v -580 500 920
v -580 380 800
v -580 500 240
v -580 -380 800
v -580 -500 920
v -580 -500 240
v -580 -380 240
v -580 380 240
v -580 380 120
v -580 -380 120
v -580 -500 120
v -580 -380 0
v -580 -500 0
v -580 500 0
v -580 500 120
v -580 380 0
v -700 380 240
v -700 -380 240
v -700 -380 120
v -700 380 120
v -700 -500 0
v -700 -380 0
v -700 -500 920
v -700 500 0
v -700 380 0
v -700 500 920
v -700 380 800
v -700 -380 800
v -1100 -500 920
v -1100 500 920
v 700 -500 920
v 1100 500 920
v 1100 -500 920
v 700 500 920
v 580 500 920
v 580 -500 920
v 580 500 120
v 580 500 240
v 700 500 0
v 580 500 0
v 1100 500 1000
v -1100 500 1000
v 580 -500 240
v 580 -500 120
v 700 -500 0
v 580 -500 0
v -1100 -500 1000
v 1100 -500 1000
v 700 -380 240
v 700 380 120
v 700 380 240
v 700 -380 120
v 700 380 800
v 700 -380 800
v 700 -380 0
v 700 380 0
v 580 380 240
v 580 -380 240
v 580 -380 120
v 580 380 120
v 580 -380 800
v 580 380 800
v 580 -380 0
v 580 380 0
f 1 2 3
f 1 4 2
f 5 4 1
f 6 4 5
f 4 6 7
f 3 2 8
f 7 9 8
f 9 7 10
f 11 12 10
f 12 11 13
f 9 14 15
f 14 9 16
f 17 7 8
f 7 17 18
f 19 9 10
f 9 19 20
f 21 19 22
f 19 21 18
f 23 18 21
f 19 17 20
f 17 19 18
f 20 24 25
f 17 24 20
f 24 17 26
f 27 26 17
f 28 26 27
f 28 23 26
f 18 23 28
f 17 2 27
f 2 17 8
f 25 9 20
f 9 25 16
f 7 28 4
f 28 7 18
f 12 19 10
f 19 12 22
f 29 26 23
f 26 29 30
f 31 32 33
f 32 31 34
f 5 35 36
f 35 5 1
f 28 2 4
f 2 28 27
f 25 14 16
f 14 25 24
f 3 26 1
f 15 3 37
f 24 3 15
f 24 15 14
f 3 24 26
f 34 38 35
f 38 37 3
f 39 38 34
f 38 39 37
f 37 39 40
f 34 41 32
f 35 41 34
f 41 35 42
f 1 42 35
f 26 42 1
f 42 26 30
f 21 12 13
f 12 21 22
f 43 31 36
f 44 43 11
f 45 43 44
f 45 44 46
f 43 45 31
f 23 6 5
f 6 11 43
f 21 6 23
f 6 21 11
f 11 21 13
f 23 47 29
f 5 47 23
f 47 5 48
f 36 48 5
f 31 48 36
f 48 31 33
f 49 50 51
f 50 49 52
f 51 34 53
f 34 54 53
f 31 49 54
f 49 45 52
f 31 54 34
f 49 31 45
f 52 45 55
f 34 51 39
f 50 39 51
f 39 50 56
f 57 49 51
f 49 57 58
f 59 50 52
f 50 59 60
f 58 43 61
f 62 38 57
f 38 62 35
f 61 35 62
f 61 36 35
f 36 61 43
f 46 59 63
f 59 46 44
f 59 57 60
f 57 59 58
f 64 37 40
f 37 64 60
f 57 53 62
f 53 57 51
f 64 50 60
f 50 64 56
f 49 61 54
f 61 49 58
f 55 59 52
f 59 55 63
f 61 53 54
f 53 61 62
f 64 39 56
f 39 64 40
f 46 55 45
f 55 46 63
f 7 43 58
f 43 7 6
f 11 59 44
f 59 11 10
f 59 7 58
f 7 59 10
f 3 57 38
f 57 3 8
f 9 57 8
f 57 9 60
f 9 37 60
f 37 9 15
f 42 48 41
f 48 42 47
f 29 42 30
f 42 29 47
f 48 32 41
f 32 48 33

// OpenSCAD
module workbench(width = 1000, length = 1500, height = 1000, deskThickness = 80, legThickness = 80, overstandDesk = 50) {

    legInnerWidth = width - legThickness * 2;
    legInnerLength = length - overstandDesk * 2 - legThickness * 2;
    legInnerHeight = height - deskThickness;

    module desk() {
        rotate([0, 0, 90]) translate([0, 0, deskThickness/2 + height - deskThickness]) cube(size = [width, length, deskThickness], center = true);
    }

    module legBase() {
        translate([-legInnerLength/2 - legThickness/2, 0, 0]) {
            leg();
            translate([legInnerLength+legThickness, 0, 0]) leg();
            
            // bottom right cross beam lenth
            rotate([0, 0, 90]) translate([-(legInnerWidth/2 + legThickness/2), -(legInnerLength/2 + legThickness/2), legThickness + legThickness/2]) cube(size=[legThickness, legInnerLength, legThickness], center = true);
            rotate([0, 0, 90]) translate([+(legInnerWidth/2 + legThickness/2), -(legInnerLength/2 + legThickness/2), legThickness + legThickness/2]) cube(size=[legThickness, legInnerLength, legThickness], center = true);
        }
    }

    module leg() {
        // bottom cross beam width
        translate([0, 0, legThickness + legThickness/2]) cube(size=[legThickness, legInnerWidth, legThickness], center = true);
        // top cross beam width
        translate([0, 0, legInnerHeight - legThickness/2]) cube(size=[legThickness, legInnerWidth, legThickness], center = true);

        // left leg
        translate([0, legInnerWidth/2 + legThickness/2, legInnerHeight/2]) cube(size=[legThickness, legThickness, legInnerHeight], center = true);
        // right leg
        translate([0, -(legInnerWidth/2 + legThickness/2), legInnerHeight/2]) cube(size=[legThickness, legThickness, legInnerHeight], center = true);
    }

    module partsList() {
        // desk
        echo(str("Tischplatte", ";", "1", ";", length, ";", width, ";", deskThickness));
        // legs
        echo(str("Beine", ";", "4", ";", legInnerHeight, ";", legThickness, ";", legThickness));
        // leg cross bars
        echo(str("Beine Querstreben", ";", "4", ";", legInnerWidth, ";", legThickness, ";", legThickness));
        // leg cross bars length
        echo(str("Beine Längsstreben", ";", "2", ";", legInnerLength, ";", legThickness, ";", legThickness));
    }

    legBase();
    desk();

    partsList();
}

//scaleFactor = 10;
//scale([1 / scaleFactor, 1 / scaleFactor, 1 / scaleFactor]) {
    // translate for printing
    //translate([0,0,1000])
    // rotate for printing
    //rotate([0, 180, 0])
    // workbench(
    //     width = 1000,
    //     length = 1800,
    //     height = 1000,
    //     deskThickness = 80,
    //     legThickness = 80,
    //     overstandDesk = 200
    // );
//}


workbench(
    width = 1000,
    length = 2200,
    height = 1000,
    deskThickness = 80,
    legThickness = 120,
    overstandDesk = 400
);
